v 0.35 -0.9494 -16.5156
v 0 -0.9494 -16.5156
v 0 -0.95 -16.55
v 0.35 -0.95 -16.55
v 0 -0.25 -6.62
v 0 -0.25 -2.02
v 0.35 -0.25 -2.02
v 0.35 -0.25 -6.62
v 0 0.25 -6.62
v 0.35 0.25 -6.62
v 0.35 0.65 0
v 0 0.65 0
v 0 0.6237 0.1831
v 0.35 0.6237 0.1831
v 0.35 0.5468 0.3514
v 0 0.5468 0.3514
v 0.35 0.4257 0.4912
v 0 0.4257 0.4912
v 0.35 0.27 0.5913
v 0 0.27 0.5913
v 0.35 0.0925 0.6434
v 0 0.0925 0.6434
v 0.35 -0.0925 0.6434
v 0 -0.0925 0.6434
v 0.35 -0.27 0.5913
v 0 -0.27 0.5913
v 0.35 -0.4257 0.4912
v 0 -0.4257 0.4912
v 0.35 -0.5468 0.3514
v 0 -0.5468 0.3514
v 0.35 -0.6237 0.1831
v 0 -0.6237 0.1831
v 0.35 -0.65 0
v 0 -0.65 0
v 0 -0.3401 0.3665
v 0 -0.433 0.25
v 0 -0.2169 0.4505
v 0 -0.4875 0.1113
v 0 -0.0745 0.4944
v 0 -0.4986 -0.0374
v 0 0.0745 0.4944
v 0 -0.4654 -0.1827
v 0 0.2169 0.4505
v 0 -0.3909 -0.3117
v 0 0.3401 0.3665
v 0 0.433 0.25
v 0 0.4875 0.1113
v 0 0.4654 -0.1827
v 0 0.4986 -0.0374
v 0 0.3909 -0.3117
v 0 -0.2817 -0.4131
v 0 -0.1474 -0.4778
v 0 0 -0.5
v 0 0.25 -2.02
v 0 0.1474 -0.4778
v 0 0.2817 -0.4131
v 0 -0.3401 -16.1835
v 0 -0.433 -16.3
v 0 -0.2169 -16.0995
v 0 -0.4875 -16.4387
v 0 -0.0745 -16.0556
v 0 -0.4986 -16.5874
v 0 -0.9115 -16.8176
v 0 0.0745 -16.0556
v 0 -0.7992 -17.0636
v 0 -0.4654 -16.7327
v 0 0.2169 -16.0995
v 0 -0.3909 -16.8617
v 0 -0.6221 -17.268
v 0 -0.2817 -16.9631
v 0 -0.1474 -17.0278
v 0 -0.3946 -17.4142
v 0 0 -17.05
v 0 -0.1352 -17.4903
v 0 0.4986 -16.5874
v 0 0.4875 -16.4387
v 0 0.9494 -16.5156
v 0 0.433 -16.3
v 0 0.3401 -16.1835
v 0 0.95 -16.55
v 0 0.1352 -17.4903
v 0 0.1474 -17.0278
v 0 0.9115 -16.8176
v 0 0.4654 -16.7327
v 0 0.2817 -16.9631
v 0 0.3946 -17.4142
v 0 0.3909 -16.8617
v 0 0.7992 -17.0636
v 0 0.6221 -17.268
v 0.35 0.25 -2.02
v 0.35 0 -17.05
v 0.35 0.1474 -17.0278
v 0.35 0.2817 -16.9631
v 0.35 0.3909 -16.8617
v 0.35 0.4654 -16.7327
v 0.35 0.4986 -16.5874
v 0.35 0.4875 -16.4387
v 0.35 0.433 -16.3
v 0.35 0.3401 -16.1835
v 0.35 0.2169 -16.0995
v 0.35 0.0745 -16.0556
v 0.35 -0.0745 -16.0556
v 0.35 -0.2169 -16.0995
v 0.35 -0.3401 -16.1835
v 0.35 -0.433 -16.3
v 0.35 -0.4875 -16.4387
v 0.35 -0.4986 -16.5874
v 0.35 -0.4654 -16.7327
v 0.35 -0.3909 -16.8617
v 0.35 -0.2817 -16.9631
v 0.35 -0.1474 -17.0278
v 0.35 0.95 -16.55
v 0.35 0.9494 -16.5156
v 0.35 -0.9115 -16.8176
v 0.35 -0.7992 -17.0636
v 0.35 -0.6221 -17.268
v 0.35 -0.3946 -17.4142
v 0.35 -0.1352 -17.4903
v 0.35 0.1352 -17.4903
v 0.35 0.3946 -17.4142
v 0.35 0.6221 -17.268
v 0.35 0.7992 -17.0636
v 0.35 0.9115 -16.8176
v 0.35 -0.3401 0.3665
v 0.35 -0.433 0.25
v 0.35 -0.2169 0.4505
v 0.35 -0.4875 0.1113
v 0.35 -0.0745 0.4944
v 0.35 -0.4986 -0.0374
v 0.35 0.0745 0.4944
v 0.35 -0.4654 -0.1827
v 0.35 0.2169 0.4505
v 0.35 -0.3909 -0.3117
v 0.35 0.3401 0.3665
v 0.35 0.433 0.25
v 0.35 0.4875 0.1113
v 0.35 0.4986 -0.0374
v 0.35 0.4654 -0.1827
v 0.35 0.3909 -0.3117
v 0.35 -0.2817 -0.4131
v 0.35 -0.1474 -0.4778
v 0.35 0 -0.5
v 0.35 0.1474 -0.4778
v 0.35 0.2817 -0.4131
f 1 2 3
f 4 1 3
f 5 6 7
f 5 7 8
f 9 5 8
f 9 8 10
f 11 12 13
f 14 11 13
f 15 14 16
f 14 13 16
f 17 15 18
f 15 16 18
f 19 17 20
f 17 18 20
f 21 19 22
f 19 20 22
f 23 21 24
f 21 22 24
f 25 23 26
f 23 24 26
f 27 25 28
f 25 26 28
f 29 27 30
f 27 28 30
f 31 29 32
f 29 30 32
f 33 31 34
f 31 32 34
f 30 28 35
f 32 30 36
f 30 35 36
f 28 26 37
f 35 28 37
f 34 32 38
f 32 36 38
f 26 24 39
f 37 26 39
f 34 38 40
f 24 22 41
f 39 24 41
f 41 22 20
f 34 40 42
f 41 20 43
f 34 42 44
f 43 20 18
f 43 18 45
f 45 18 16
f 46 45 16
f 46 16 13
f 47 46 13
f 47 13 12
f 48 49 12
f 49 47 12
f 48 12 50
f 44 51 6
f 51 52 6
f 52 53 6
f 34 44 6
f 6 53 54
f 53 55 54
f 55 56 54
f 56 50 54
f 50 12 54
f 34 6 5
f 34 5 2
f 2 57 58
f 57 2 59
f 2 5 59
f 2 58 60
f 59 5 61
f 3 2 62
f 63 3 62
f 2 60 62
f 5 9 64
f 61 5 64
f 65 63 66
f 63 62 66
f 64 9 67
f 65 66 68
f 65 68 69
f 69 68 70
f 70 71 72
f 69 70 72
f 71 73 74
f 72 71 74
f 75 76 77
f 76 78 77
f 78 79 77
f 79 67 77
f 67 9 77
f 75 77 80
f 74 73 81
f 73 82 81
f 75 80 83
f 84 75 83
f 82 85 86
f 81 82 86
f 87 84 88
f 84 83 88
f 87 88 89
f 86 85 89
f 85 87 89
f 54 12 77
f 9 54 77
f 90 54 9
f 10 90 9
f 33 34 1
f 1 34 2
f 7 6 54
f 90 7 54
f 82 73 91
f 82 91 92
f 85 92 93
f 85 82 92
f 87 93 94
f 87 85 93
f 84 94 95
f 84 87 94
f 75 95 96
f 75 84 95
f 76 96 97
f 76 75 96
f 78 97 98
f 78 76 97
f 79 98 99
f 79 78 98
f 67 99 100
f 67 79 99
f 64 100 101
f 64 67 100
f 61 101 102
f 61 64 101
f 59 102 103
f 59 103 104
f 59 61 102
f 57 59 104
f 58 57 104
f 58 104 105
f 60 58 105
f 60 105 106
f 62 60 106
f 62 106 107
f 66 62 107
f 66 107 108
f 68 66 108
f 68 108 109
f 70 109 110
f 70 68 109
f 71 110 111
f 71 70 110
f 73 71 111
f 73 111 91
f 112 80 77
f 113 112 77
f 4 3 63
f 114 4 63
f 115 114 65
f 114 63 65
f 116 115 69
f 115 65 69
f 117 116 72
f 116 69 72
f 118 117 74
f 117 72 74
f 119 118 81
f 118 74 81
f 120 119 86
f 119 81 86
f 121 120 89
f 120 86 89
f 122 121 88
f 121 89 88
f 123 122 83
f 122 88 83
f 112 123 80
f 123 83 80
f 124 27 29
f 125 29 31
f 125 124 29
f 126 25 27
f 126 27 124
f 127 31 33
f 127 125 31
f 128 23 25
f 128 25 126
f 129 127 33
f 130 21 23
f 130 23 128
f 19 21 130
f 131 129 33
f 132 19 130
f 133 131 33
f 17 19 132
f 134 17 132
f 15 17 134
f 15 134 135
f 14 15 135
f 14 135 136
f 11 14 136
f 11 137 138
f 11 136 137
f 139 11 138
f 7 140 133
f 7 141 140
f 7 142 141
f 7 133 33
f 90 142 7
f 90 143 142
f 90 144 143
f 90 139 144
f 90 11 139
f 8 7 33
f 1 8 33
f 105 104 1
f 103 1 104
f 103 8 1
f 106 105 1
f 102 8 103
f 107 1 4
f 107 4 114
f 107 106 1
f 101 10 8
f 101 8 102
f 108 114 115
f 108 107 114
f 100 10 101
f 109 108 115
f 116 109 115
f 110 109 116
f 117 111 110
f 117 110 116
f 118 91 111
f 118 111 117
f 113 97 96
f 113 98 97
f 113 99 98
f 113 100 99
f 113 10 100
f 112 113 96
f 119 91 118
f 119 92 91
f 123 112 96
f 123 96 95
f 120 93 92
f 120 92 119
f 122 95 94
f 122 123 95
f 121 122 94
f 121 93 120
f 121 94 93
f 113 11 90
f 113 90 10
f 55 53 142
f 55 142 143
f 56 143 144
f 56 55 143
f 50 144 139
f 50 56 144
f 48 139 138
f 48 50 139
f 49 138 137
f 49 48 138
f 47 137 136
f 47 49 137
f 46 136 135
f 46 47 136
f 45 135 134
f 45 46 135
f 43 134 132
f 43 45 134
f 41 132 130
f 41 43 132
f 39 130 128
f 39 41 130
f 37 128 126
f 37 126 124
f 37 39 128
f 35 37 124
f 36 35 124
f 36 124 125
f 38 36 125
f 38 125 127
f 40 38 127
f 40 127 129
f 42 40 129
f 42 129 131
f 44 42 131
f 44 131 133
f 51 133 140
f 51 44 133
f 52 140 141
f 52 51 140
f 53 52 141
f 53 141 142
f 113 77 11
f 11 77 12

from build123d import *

# Parameters (mm, degrees)
SKETCH1_R           = 0.5
SKETCH1_W           = 4.6
SKETCH1_H           = 0.5
BOSS_EXTRUDE1_DEPTH = 0.35


with BuildPart() as part:
    # Sketch1 → Boss-Extrude1 (new body)
    with BuildSketch(Plane(origin=(0, 0, 0), x_dir=(0, 0, -1), z_dir=(1, 0, 0))):
        with BuildLine():
            Line((16.515570225, 0.949375895), (0, 0.65))
            ThreePointArc((0, 0.65), (-0.65, 0), (0, -0.65))
            Line((0, -0.65), (16.515570225, -0.949375895))
            Line((16.515570225, -0.949375895), (16.55, -0.95))
            ThreePointArc((16.55, -0.95), (17.5, 0), (16.55, 0.95))
            Line((16.55, 0.95), (16.515570225, 0.949375895))
        make_face()
        Circle(SKETCH1_R, mode=Mode.SUBTRACT)
        with Locations((4.32, 0)):
            Rectangle(SKETCH1_W, SKETCH1_H, mode=Mode.SUBTRACT)
        with Locations((16.55, 0)):
            Circle(SKETCH1_R, mode=Mode.SUBTRACT)
    extrude(amount=BOSS_EXTRUDE1_DEPTH)


solid = part.part
